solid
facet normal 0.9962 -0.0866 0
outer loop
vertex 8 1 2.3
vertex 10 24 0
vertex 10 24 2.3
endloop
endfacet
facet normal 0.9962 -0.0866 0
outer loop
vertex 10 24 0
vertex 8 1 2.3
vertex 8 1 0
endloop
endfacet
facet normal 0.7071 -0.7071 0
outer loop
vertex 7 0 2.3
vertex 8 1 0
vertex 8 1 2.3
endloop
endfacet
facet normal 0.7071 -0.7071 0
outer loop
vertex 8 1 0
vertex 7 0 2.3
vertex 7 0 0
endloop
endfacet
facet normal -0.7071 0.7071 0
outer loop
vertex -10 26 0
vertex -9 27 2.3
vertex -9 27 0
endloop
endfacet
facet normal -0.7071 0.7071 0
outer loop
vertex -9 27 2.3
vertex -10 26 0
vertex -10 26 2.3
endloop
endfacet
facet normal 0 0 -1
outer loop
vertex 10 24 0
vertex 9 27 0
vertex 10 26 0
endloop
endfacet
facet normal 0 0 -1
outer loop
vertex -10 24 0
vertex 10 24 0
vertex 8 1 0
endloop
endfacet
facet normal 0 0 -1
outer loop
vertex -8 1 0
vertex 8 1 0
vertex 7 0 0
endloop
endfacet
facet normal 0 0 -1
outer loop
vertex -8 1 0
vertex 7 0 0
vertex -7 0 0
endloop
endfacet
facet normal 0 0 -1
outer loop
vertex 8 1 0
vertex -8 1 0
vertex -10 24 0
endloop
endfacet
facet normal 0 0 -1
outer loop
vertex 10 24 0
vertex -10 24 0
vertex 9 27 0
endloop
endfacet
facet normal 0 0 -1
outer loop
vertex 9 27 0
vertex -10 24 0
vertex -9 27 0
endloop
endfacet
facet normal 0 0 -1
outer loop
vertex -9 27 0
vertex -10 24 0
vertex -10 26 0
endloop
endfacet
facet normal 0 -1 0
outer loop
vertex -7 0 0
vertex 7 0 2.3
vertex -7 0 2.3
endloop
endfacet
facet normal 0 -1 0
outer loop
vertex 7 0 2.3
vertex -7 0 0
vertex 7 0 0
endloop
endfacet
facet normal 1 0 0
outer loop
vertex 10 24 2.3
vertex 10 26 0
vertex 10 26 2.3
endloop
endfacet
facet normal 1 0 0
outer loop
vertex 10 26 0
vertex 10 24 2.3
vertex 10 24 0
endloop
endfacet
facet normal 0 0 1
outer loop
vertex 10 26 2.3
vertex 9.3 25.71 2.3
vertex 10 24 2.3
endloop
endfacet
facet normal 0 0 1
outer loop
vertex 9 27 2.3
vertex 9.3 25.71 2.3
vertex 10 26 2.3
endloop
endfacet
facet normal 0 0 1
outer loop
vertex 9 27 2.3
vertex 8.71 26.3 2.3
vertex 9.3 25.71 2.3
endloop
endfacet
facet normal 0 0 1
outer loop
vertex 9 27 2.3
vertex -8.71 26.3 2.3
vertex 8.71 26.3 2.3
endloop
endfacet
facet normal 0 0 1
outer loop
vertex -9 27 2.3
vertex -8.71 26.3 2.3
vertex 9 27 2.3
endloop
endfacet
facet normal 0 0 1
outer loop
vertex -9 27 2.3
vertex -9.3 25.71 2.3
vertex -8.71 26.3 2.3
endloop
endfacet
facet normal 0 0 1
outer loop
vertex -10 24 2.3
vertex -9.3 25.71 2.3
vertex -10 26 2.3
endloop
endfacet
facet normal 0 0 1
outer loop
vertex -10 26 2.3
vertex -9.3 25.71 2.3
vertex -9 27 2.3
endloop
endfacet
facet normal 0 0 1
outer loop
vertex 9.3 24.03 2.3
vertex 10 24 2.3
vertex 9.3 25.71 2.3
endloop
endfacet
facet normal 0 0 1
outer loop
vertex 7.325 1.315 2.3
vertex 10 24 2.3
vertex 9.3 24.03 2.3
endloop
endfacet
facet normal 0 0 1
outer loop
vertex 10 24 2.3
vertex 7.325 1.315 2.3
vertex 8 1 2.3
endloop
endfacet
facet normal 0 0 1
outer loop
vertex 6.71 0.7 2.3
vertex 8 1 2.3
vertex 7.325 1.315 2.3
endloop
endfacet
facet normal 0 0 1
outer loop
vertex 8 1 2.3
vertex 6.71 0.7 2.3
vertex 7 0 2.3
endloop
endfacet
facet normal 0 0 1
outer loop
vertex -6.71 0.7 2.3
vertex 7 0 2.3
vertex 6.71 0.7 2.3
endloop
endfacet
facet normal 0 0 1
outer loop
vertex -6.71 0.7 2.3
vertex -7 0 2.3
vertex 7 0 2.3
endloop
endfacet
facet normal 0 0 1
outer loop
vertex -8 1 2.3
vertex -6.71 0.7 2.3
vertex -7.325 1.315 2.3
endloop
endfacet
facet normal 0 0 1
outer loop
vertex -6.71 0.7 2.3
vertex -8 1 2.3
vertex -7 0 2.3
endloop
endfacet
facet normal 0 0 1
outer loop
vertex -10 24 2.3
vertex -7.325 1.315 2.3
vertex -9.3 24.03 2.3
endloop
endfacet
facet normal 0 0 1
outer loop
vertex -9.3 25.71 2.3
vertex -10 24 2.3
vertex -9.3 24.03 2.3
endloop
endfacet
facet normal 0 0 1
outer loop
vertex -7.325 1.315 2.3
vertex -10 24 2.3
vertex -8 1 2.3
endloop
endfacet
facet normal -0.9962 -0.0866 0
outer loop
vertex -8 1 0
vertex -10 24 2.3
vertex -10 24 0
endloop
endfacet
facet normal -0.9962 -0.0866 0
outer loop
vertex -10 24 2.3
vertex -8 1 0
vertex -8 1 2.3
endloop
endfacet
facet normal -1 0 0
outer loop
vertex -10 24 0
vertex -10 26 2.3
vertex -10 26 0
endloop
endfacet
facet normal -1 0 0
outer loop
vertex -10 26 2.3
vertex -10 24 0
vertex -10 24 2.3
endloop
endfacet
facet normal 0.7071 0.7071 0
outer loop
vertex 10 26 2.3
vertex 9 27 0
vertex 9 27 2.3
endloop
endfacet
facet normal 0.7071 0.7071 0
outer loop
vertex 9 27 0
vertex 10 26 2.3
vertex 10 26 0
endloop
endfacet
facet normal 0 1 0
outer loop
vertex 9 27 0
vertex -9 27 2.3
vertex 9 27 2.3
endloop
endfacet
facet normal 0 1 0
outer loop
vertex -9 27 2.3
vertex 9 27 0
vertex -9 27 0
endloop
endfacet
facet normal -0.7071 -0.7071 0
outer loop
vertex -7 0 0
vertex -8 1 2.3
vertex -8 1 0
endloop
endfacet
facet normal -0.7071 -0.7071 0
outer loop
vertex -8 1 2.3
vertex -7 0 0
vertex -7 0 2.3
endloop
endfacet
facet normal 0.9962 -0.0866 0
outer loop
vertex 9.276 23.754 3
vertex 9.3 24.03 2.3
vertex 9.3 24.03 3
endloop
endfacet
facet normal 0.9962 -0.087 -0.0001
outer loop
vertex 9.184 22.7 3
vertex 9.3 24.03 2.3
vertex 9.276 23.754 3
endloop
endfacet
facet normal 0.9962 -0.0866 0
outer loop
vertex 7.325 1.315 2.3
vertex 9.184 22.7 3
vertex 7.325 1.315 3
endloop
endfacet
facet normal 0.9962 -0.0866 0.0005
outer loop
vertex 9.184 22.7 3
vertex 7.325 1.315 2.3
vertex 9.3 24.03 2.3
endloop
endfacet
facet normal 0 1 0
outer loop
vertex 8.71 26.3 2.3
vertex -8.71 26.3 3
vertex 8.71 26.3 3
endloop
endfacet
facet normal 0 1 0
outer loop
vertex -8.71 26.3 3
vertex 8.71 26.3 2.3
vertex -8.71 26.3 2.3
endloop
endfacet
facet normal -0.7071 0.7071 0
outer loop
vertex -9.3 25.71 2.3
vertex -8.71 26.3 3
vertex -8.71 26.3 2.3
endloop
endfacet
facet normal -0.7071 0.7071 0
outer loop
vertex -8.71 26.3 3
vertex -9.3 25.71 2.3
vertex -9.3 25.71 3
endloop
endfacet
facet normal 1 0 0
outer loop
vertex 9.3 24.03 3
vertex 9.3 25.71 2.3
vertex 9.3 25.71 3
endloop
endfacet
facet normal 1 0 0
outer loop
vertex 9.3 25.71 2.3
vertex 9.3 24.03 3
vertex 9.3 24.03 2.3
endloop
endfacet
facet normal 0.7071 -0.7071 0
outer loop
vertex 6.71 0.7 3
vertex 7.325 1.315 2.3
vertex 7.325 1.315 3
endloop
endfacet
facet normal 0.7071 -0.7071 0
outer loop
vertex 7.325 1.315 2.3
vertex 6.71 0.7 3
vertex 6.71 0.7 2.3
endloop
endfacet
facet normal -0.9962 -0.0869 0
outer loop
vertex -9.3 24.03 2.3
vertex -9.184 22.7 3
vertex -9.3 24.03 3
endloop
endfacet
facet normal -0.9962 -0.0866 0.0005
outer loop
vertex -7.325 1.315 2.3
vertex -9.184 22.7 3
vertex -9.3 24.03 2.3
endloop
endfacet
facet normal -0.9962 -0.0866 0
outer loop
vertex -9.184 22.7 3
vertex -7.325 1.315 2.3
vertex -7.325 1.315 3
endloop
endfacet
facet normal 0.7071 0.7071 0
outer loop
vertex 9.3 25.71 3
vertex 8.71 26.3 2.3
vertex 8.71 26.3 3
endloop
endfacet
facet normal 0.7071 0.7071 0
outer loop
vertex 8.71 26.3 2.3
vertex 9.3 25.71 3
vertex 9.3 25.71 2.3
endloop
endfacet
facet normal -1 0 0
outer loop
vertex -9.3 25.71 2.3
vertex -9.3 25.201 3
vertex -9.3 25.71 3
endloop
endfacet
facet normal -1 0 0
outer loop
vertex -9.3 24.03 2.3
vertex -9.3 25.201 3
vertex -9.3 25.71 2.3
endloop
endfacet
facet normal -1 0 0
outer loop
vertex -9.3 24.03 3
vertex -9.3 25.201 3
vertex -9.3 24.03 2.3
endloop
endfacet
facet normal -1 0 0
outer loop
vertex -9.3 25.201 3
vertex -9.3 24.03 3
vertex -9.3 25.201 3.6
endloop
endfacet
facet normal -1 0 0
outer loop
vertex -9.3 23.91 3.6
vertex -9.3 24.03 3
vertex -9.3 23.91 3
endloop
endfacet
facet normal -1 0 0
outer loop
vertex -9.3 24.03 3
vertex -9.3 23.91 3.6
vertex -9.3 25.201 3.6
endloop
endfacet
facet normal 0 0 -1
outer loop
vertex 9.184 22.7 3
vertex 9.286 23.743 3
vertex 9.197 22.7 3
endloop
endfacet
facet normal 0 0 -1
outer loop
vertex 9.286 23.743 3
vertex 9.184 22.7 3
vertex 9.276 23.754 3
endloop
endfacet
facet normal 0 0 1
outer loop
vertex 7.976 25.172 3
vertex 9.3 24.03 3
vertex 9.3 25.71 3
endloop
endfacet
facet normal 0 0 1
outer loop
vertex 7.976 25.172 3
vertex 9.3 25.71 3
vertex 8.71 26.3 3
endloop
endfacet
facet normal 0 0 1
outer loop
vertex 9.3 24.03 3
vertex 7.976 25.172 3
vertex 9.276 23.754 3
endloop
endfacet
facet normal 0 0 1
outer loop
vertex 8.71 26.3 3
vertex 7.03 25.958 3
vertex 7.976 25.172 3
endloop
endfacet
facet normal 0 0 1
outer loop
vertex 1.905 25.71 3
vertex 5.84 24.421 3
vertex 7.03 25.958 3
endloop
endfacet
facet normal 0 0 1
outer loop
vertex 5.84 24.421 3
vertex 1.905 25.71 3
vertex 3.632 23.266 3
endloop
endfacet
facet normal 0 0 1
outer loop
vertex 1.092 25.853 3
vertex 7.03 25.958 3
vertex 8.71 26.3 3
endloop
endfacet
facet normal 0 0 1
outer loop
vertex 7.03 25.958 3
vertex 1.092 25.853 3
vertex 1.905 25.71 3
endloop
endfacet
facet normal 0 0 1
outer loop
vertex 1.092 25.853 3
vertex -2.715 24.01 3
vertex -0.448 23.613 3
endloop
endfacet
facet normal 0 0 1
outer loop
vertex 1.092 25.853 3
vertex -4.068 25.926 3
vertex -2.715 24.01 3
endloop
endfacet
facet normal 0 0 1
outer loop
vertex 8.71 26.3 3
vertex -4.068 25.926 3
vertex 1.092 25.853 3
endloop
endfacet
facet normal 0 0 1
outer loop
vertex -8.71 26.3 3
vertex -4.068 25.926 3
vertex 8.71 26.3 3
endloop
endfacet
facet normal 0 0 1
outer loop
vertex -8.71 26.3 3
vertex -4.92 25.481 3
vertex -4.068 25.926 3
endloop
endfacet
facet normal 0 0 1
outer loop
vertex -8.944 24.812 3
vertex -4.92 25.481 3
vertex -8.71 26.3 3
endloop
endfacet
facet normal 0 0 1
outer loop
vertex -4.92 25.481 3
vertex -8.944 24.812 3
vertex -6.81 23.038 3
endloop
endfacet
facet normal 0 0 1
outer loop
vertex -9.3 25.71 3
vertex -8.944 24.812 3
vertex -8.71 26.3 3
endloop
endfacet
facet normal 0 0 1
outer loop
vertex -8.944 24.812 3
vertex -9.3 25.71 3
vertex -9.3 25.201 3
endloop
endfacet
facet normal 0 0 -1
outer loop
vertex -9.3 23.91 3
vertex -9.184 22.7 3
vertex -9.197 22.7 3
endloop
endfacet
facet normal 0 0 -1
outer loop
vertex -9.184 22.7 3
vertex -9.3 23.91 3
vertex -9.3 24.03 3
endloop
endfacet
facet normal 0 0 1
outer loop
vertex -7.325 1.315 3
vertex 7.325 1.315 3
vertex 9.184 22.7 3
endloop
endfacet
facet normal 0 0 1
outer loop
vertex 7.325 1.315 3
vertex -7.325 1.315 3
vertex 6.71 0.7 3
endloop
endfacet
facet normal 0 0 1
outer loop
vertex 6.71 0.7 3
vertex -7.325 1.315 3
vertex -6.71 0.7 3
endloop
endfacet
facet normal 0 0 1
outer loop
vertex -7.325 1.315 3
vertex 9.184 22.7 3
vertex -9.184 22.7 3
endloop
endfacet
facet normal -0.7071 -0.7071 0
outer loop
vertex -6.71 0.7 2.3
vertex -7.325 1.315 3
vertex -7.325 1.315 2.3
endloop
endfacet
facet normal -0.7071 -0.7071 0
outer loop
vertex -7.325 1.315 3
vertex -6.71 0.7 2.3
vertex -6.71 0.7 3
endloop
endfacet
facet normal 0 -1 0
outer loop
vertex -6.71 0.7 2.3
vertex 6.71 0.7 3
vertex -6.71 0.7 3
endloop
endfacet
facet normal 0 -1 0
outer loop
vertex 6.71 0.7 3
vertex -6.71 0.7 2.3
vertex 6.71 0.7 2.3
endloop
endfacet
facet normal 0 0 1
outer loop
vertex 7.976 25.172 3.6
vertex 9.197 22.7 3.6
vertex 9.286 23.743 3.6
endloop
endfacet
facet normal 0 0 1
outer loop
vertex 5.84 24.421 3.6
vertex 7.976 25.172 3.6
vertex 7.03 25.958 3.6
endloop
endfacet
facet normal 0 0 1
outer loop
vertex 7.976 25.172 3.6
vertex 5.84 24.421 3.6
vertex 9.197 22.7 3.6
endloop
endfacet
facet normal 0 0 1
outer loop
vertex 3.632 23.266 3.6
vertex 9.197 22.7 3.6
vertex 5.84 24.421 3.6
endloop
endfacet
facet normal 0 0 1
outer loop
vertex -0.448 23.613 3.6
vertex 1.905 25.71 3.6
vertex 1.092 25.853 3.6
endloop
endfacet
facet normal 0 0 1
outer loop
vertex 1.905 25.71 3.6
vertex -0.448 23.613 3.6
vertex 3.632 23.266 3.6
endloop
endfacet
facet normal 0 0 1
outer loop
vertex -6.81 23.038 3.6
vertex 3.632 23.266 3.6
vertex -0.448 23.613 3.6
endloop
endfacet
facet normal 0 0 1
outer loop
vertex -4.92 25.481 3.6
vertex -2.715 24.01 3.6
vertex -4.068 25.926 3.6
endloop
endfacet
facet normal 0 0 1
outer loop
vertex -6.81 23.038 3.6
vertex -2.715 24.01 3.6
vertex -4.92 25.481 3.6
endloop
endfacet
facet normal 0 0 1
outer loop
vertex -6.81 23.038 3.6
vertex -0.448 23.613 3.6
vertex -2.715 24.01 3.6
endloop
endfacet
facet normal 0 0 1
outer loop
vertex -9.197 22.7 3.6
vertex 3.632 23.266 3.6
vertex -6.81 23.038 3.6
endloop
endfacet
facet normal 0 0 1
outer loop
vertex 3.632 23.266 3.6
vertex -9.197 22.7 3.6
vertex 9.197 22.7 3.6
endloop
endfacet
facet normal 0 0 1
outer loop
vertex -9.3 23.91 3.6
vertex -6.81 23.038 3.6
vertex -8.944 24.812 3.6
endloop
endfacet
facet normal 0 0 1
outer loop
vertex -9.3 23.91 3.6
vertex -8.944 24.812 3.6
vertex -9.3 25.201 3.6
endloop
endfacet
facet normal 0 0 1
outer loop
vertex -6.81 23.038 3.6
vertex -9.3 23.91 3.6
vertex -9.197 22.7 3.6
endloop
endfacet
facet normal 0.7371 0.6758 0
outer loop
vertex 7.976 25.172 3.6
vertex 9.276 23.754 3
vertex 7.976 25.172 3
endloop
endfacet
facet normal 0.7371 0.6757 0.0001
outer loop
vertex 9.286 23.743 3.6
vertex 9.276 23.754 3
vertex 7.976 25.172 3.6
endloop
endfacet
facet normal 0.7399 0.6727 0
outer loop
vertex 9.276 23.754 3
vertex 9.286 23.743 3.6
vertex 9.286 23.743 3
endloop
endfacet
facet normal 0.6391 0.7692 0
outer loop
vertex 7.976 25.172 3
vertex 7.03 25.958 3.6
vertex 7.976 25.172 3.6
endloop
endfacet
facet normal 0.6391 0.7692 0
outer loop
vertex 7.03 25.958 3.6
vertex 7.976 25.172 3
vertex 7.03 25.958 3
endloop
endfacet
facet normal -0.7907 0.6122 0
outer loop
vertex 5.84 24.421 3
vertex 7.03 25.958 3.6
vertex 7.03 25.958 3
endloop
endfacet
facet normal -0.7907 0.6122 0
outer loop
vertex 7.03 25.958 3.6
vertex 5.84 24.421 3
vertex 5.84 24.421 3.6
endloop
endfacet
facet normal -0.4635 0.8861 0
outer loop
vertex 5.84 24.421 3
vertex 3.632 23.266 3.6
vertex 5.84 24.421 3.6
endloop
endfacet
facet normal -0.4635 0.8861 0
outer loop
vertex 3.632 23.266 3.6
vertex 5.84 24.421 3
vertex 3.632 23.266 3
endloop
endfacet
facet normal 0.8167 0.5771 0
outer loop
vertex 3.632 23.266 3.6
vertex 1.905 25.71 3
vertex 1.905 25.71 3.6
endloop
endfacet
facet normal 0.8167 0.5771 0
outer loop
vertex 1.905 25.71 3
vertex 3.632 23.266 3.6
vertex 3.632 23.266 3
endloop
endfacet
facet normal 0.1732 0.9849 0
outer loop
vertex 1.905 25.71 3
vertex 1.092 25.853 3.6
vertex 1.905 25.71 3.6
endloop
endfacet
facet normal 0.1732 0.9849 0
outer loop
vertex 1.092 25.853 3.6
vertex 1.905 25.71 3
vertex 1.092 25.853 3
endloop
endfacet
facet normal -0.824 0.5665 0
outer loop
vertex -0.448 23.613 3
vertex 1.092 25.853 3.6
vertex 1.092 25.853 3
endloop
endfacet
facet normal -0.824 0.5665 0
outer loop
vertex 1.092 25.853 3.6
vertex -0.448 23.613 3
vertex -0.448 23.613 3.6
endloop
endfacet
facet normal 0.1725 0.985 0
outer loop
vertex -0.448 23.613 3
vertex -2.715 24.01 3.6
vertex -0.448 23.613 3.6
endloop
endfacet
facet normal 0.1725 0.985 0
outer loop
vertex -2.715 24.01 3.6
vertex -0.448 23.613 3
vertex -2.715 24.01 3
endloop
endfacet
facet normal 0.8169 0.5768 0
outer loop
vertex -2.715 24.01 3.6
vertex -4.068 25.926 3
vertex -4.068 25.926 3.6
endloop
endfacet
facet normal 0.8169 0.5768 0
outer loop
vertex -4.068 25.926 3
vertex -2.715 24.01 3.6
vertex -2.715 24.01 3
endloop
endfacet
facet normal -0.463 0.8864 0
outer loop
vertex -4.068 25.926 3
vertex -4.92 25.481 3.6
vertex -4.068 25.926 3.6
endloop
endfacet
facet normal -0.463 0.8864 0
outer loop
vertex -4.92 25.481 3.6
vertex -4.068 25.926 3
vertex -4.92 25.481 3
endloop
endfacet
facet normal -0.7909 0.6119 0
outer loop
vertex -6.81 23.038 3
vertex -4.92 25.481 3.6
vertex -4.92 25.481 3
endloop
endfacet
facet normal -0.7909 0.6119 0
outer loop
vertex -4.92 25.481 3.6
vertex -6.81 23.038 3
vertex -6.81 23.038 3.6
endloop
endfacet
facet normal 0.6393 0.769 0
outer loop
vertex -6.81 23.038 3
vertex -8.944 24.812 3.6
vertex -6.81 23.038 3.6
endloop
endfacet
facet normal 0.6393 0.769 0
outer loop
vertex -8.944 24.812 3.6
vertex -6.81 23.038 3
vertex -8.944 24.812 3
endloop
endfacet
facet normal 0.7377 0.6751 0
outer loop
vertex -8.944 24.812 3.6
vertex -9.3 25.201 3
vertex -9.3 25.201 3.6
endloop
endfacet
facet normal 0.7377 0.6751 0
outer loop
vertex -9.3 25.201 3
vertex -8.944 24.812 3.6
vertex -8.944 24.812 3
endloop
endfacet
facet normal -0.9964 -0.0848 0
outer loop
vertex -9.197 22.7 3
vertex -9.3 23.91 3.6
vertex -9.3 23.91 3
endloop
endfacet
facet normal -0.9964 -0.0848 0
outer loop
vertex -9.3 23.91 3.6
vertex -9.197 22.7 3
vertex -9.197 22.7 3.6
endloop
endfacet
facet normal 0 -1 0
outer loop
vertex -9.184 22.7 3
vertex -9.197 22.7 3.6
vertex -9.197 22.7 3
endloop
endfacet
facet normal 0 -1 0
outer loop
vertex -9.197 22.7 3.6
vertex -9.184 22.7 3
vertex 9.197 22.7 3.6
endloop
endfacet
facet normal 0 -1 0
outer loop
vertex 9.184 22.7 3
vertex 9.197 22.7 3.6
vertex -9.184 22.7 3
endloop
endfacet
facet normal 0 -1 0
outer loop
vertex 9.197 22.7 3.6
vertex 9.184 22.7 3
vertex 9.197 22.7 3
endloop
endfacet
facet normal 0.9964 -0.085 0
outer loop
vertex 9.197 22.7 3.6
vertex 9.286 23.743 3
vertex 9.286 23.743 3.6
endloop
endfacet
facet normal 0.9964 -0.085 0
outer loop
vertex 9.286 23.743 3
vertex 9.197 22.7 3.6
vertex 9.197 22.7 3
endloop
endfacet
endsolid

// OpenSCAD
// Jetons Bière de Brassins : une silhouette de verre par style, à plat. Généré par pintes.py, modifiable à la main.
epaisseur = 3.0; chanfrein = 0.7; relief = 0.6;
style = "blonde"; // blonde, ipa, stout, garde

module verre_blonde() { polygon([[-7.0, 0.0], [-8.0, 1.0], [-10.0, 24.0], [-10.0, 26.0], [-9.0, 27.0], [9.0, 27.0], [10.0, 26.0], [10.0, 24.0], [8.0, 1.0], [7.0, 0.0]]); }
module mousse_blonde() { polygon([[-10.0, 26.01], [-9.53, 26.49], [-8.46, 25.32], [-6.92, 24.04], [-5.38, 26.03], [-3.85, 26.83], [-2.31, 24.65], [-0.77, 24.38], [0.77, 26.62], [2.31, 26.35], [3.85, 24.17], [5.38, 24.97], [6.92, 26.96], [8.46, 25.68], [10.0, 24.0], [10.0, 23.88], [9.84, 22.0], [-9.84, 22.0], [-10.0, 23.88]]); }
module verre_ipa() { polygon([[5.0, 0.0], [-5.0, 0.0], [-5.0, 1.2], [-1.6, 2.2], [-1.6, 4.0], [-4.0, 5.0], [-7.5, 8.0], [-9.0, 12.0], [-8.4, 16.0], [-6.6, 19.0], [-6.9, 22.0], [-8.6, 25.5], [-9.5, 27.0], [9.5, 27.0], [8.6, 25.5], [6.9, 22.0], [6.6, 19.0], [8.4, 16.0], [9.0, 12.0], [7.5, 8.0], [4.0, 5.0], [1.6, 4.0], [1.6, 2.2], [5.0, 1.2]]); }
module mousse_ipa() { polygon([[-9.5, 27.01], [-9.15, 27.01], [-8.04, 26.04], [-6.58, 24.66], [-5.12, 26.83], [-3.65, 26.8], [-2.19, 24.65], [-0.73, 26.07], [0.39, 27.01], [0.92, 27.01], [2.19, 25.09], [3.65, 25.29], [4.86, 27.01], [5.46, 27.01], [6.58, 25.83], [8.04, 24.74], [9.5, 26.99], [9.5, 26.98], [8.61, 25.5], [7.4, 23.0], [-7.4, 23.0], [-8.61, 25.5], [-9.5, 26.98]]); }
module verre_stout() { polygon([[6.0, 0.0], [-8.0, 0.0], [-8.0, 27.0], [6.0, 27.0], [6.0, 21.0], [6.74, 20.96], [7.46, 20.86], [8.18, 20.68], [8.87, 20.43], [9.54, 20.11], [10.17, 19.74], [10.76, 19.3], [11.3, 18.8], [11.8, 18.26], [12.24, 17.67], [12.61, 17.04], [12.93, 16.37], [13.18, 15.68], [13.36, 14.96], [13.46, 14.24], [13.5, 13.5], [13.46, 12.76], [13.36, 12.04], [13.18, 11.32], [12.93, 10.63], [12.61, 9.96], [12.24, 9.33], [11.8, 8.74], [11.3, 8.2], [10.76, 7.7], [10.17, 7.26], [9.54, 6.89], [8.87, 6.57], [8.18, 6.32], [7.46, 6.14], [6.74, 6.04], [6.0, 6.0]]); }
module mousse_stout() { polygon([[-8.0, 24.05], [-6.73, 25.81], [-5.45, 26.98], [-4.18, 25.32], [-2.91, 24.0], [-1.64, 25.55], [-0.36, 27.0], [0.91, 25.58], [2.18, 24.01], [3.45, 25.29], [4.73, 26.98], [6.0, 25.83], [6.0, 22.0], [-8.0, 22.0]]); }
module verre_garde() { polygon([[-7.0, 0.0], [-7.0, 1.5], [-1.8, 2.5], [-1.8, 11.0], [-5.79, 11.11], [-7.16, 12.55], [-8.19, 14.26], [-8.81, 16.16], [-9.0, 18.14], [-8.75, 20.12], [-8.06, 22.0], [-6.99, 23.67], [-5.56, 25.07], [-3.87, 26.13], [-1.98, 26.78], [-0.0, 27.0], [0.0, 27.0], [0.0, 27.0], [1.98, 26.78], [3.87, 26.13], [5.56, 25.07], [6.99, 23.67], [8.06, 22.0], [8.75, 20.12], [9.0, 18.14], [8.81, 16.16], [8.19, 14.26], [7.16, 12.55], [5.79, 11.11], [1.8, 11.0], [1.8, 2.5], [7.0, 1.5], [7.0, 0.0]]); }
module mousse_garde() { polygon([[-4.85, 24.78], [-4.07, 26.01], [-3.87, 26.13], [-3.87, 26.14], [-3.87, 26.14], [-3.04, 26.42], [-2.08, 25.15], [-0.69, 24.26], [0.69, 26.74], [2.08, 25.85], [3.46, 24.01], [4.53, 25.72], [5.57, 25.08], [5.57, 25.08], [5.57, 25.08], [6.99, 23.68], [6.99, 23.68], [6.99, 23.68], [8.07, 22.0], [8.07, 22.0], [8.07, 22.0], [8.07, 22.0], [-8.07, 22.0], [-8.07, 22.0], [-8.07, 22.0], [-8.07, 22.0], [-6.99, 23.68], [-6.99, 23.68], [-6.99, 23.68], [-6.11, 24.55]]); }

module jeton(st) {
  linear_extrude(epaisseur - chanfrein) verre(st);
  translate([0, 0, epaisseur - chanfrein]) linear_extrude(chanfrein) offset(delta = -chanfrein) verre(st);
  translate([0, 0, epaisseur]) linear_extrude(relief) offset(delta = -chanfrein) mousse(st);
}
module verre(st) { if (st == "blonde") verre_blonde(); else if (st == "ipa") verre_ipa(); else if (st == "stout") verre_stout(); else verre_garde(); }
module mousse(st) { if (st == "blonde") mousse_blonde(); else if (st == "ipa") mousse_ipa(); else if (st == "stout") mousse_stout(); else mousse_garde(); }

jeton(style);
